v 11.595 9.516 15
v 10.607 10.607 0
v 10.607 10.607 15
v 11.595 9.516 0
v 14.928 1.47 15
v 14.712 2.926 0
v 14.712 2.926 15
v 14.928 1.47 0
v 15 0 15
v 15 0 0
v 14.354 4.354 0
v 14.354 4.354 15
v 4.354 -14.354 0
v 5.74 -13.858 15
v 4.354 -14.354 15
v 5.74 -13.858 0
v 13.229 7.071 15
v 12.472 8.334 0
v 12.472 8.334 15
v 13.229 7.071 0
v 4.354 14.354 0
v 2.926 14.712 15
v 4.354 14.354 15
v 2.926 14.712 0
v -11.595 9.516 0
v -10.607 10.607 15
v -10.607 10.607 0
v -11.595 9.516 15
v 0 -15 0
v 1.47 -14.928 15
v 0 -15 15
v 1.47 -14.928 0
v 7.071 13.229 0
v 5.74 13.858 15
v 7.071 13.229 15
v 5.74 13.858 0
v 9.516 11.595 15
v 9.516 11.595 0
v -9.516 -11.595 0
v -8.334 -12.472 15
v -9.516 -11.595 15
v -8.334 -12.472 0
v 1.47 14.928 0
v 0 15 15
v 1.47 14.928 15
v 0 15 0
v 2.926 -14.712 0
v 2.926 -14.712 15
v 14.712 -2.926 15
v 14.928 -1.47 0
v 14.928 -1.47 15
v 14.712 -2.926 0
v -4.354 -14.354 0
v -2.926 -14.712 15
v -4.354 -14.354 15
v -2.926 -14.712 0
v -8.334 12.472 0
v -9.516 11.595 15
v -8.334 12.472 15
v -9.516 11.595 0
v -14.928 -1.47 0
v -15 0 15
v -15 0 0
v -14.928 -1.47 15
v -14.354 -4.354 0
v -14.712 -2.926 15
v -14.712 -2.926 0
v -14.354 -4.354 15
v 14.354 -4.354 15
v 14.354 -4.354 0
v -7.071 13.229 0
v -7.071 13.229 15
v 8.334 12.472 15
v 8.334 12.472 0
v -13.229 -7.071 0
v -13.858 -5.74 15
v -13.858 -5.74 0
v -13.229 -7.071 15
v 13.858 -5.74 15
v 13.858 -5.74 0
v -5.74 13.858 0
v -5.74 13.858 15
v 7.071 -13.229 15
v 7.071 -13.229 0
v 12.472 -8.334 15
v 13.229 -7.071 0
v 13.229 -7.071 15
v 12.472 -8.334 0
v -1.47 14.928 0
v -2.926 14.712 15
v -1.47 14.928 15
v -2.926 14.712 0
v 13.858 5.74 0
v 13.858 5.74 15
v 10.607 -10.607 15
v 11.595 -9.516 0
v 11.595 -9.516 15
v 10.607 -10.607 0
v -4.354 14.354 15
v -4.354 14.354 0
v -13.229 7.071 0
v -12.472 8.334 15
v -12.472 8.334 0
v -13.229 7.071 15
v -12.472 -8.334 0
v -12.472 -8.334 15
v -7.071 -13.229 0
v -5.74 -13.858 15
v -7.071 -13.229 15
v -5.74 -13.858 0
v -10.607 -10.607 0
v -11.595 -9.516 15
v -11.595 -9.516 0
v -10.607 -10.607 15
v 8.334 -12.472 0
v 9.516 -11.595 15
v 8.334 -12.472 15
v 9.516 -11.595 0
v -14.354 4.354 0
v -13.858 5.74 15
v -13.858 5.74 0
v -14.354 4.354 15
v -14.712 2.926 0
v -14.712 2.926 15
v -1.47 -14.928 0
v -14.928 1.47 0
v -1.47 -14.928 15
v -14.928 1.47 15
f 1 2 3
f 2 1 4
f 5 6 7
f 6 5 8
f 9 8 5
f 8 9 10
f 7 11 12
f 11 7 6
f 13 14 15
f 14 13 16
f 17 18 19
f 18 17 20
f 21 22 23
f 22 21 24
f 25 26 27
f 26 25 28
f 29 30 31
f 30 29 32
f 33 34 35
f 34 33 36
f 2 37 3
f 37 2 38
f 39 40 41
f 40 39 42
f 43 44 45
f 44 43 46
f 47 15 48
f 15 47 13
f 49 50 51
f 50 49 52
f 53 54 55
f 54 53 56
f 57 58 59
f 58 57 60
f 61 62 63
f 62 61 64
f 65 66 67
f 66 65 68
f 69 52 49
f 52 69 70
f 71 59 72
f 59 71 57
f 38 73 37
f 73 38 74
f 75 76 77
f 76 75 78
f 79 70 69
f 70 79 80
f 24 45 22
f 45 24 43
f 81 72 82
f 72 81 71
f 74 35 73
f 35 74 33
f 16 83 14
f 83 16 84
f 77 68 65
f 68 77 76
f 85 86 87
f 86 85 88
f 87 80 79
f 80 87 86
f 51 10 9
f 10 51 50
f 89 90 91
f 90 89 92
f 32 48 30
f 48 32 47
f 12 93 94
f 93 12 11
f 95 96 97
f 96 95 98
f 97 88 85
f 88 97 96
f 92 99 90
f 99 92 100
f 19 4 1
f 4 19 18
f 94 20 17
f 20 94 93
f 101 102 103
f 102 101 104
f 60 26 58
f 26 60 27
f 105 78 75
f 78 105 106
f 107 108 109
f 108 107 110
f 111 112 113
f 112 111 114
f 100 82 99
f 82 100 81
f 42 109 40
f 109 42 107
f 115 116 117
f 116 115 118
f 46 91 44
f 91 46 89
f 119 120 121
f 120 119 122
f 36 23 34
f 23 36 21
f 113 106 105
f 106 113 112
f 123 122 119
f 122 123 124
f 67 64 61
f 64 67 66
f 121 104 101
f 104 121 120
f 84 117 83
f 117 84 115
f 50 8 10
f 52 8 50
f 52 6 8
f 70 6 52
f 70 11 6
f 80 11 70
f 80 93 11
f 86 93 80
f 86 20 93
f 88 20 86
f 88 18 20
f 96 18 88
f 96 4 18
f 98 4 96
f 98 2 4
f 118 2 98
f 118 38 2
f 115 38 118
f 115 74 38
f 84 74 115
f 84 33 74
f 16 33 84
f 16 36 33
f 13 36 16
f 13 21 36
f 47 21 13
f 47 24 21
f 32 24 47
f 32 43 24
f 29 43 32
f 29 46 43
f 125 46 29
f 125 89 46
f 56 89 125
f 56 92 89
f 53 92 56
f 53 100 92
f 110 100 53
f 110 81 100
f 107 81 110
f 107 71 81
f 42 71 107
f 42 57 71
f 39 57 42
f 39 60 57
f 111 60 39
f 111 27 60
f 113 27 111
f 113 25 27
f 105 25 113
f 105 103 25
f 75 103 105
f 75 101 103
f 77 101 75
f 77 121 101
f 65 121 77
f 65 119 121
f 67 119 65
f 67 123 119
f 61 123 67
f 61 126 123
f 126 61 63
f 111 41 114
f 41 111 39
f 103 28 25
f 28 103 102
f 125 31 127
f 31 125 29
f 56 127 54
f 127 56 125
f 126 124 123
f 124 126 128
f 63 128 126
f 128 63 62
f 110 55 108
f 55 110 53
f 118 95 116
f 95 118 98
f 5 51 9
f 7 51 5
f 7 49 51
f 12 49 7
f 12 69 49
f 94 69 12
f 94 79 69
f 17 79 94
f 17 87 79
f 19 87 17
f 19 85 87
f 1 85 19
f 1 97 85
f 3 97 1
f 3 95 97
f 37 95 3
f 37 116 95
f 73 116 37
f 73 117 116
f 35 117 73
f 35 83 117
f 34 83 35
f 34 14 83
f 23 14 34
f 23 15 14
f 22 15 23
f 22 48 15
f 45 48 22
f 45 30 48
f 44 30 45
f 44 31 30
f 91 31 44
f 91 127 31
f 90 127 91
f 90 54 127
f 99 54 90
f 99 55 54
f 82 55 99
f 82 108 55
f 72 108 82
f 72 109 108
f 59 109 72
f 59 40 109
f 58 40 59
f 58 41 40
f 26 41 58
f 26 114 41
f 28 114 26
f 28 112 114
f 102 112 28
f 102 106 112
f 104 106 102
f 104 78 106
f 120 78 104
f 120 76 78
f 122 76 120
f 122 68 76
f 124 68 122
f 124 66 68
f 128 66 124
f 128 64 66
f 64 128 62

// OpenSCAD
// Replacement knob for hotplate stirrer
// D-shaft: 6 mm, Knob: 30 mm dia x 15 mm tall, printed with bottom face on bed (z=0)

// --- Knob outer dimensions ---
knob_dia = 30;           // Outer diameter of knob (mm)
knob_h = 15;             // Total height of knob (mm)
knob_r = knob_dia / 2;  // Outer radius

// --- D-shaft bore dimensions ---
shaft_dia = 6;           // Shaft diameter (mm)
bore_dia = 6.2;           // Bore diameter (slight clearance) (mm)
bore_r = bore_dia / 2;   // Bore radius
bore_depth = 12;         // Depth of blind bore from bottom (mm)
flat_to_opposite = 4.7;  // Distance from flat to opposite side of circle (mm)

// --- Grip grooves ---
num_grooves = 18;         // Number of vertical grip grooves
groove_dia = 2;           // Diameter of half-cylinder groove (mm)
groove_r = groove_dia / 2;

// --- Pointer groove ---
pointer_width = 1.5;      // Width of pointer groove (mm)
pointer_depth = 1;       // Depth of pointer groove (mm)

// --- Calculated values ---
// For D-shape: the flat is cut such that distance from flat to opposite side = 4.7 mm
// The circle has radius 3.1 mm. The flat is at distance (3.1 - (4.7 - 3.1)) = 1.5 mm from center
// So the flat is at x = 1.5 mm (if flat is on the right side)
flat_offset = bore_r - (flat_to_opposite - bore_r);  // Distance from center to flat

// Groove center is on outer surface, so groove center radius = knob_r
groove_center_r = knob_r;

// --- Build the knob ---
union() {
    // Main cylinder body
    cylinder(r = knob_r, h = knob_h, $fn = 64);
    
    // Add material for grip grooves (they are half-cylinders on the surface)
    for (i = [0 : num_grooves - 1]) {
        angle = i * 360 / num_grooves;
        translate([cos(angle) * groove_center_r, sin(angle) * groove_center_r, 0]) {
            rotate([0, 0, angle]) {
                // Half-cylinder groove: we'll subtract it later, but for union we need the full shape
                // Actually, we'll build the knob solid first, then subtract grooves
                // So we don't add anything here for grooves
            }
        }
    }
}

// --- Subtract features ---
difference() {
    // The main knob body (rebuild to ensure clean solid)
    union() {
        cylinder(r = knob_r, h = knob_h, $fn = 64);
    }
    
    // D-shaped blind bore from bottom (z=0)
    translate([0, 0, bore_depth - 0.01]) {
        // Cylinder part of bore
        cylinder(r = bore_r, h = 0.02, $fn = 64);
        
        // Cut the flat side: the flat is at x = flat_offset
        // We cut from x = flat_offset to x = bore_r + 0.01
        translate([flat_offset + 0.01, 0, 0]) {
            cube([bore_r + 0.01, bore_dia + 0.02, 0.02], center = [0, 0, 0]);
        }
    }
    
    // Vertical grip grooves (half-cylinders on outer surface)
    for (i = [0 : num_grooves - 1]) {
        angle = i * 360 / num_grooves;
        translate([cos(angle) * groove_center_r, sin(angle) * groove_center_r, 0]) {
            rotate([0, 0, angle]) {
                // Half-cylinder groove: cut from the outer surface inward
                // The groove is a half-cylinder with diameter groove_dia, centered on the surface
                // So it extends from r = knob_r - groove_r to r = knob_r + groove_r
                // But since it's a half-cylinder on the surface, we only cut the inner half
                // Actually, for a half-cylinder groove on the surface, the cut goes from the surface inward by groove_r
                translate([groove_r, 0, 0]) {
                    // Full cylinder, but we only want the half that cuts into the knob
                    // Since we're subtracting, we can use a full cylinder and it will only remove material where it overlaps
                    cylinder(r = groove_r, h = knob_h + 0.02, $fn = 32);
                }
            }
        }
    }
    
    // Pointer groove on top face
    // Runs from center to outer edge, on the same side as the flat of the D
    // The flat is on the right side (positive x), so pointer groove is along positive x-axis
    translate([0, 0, knob_h - pointer_depth]) {
        // Rectangular groove from center to edge
        translate([pointer_width / 2, 0, 0]) {
            cube([knob_r, pointer_width, pointer_depth + 0.01], center = [0, 0, 0]);
        }
    }
}
